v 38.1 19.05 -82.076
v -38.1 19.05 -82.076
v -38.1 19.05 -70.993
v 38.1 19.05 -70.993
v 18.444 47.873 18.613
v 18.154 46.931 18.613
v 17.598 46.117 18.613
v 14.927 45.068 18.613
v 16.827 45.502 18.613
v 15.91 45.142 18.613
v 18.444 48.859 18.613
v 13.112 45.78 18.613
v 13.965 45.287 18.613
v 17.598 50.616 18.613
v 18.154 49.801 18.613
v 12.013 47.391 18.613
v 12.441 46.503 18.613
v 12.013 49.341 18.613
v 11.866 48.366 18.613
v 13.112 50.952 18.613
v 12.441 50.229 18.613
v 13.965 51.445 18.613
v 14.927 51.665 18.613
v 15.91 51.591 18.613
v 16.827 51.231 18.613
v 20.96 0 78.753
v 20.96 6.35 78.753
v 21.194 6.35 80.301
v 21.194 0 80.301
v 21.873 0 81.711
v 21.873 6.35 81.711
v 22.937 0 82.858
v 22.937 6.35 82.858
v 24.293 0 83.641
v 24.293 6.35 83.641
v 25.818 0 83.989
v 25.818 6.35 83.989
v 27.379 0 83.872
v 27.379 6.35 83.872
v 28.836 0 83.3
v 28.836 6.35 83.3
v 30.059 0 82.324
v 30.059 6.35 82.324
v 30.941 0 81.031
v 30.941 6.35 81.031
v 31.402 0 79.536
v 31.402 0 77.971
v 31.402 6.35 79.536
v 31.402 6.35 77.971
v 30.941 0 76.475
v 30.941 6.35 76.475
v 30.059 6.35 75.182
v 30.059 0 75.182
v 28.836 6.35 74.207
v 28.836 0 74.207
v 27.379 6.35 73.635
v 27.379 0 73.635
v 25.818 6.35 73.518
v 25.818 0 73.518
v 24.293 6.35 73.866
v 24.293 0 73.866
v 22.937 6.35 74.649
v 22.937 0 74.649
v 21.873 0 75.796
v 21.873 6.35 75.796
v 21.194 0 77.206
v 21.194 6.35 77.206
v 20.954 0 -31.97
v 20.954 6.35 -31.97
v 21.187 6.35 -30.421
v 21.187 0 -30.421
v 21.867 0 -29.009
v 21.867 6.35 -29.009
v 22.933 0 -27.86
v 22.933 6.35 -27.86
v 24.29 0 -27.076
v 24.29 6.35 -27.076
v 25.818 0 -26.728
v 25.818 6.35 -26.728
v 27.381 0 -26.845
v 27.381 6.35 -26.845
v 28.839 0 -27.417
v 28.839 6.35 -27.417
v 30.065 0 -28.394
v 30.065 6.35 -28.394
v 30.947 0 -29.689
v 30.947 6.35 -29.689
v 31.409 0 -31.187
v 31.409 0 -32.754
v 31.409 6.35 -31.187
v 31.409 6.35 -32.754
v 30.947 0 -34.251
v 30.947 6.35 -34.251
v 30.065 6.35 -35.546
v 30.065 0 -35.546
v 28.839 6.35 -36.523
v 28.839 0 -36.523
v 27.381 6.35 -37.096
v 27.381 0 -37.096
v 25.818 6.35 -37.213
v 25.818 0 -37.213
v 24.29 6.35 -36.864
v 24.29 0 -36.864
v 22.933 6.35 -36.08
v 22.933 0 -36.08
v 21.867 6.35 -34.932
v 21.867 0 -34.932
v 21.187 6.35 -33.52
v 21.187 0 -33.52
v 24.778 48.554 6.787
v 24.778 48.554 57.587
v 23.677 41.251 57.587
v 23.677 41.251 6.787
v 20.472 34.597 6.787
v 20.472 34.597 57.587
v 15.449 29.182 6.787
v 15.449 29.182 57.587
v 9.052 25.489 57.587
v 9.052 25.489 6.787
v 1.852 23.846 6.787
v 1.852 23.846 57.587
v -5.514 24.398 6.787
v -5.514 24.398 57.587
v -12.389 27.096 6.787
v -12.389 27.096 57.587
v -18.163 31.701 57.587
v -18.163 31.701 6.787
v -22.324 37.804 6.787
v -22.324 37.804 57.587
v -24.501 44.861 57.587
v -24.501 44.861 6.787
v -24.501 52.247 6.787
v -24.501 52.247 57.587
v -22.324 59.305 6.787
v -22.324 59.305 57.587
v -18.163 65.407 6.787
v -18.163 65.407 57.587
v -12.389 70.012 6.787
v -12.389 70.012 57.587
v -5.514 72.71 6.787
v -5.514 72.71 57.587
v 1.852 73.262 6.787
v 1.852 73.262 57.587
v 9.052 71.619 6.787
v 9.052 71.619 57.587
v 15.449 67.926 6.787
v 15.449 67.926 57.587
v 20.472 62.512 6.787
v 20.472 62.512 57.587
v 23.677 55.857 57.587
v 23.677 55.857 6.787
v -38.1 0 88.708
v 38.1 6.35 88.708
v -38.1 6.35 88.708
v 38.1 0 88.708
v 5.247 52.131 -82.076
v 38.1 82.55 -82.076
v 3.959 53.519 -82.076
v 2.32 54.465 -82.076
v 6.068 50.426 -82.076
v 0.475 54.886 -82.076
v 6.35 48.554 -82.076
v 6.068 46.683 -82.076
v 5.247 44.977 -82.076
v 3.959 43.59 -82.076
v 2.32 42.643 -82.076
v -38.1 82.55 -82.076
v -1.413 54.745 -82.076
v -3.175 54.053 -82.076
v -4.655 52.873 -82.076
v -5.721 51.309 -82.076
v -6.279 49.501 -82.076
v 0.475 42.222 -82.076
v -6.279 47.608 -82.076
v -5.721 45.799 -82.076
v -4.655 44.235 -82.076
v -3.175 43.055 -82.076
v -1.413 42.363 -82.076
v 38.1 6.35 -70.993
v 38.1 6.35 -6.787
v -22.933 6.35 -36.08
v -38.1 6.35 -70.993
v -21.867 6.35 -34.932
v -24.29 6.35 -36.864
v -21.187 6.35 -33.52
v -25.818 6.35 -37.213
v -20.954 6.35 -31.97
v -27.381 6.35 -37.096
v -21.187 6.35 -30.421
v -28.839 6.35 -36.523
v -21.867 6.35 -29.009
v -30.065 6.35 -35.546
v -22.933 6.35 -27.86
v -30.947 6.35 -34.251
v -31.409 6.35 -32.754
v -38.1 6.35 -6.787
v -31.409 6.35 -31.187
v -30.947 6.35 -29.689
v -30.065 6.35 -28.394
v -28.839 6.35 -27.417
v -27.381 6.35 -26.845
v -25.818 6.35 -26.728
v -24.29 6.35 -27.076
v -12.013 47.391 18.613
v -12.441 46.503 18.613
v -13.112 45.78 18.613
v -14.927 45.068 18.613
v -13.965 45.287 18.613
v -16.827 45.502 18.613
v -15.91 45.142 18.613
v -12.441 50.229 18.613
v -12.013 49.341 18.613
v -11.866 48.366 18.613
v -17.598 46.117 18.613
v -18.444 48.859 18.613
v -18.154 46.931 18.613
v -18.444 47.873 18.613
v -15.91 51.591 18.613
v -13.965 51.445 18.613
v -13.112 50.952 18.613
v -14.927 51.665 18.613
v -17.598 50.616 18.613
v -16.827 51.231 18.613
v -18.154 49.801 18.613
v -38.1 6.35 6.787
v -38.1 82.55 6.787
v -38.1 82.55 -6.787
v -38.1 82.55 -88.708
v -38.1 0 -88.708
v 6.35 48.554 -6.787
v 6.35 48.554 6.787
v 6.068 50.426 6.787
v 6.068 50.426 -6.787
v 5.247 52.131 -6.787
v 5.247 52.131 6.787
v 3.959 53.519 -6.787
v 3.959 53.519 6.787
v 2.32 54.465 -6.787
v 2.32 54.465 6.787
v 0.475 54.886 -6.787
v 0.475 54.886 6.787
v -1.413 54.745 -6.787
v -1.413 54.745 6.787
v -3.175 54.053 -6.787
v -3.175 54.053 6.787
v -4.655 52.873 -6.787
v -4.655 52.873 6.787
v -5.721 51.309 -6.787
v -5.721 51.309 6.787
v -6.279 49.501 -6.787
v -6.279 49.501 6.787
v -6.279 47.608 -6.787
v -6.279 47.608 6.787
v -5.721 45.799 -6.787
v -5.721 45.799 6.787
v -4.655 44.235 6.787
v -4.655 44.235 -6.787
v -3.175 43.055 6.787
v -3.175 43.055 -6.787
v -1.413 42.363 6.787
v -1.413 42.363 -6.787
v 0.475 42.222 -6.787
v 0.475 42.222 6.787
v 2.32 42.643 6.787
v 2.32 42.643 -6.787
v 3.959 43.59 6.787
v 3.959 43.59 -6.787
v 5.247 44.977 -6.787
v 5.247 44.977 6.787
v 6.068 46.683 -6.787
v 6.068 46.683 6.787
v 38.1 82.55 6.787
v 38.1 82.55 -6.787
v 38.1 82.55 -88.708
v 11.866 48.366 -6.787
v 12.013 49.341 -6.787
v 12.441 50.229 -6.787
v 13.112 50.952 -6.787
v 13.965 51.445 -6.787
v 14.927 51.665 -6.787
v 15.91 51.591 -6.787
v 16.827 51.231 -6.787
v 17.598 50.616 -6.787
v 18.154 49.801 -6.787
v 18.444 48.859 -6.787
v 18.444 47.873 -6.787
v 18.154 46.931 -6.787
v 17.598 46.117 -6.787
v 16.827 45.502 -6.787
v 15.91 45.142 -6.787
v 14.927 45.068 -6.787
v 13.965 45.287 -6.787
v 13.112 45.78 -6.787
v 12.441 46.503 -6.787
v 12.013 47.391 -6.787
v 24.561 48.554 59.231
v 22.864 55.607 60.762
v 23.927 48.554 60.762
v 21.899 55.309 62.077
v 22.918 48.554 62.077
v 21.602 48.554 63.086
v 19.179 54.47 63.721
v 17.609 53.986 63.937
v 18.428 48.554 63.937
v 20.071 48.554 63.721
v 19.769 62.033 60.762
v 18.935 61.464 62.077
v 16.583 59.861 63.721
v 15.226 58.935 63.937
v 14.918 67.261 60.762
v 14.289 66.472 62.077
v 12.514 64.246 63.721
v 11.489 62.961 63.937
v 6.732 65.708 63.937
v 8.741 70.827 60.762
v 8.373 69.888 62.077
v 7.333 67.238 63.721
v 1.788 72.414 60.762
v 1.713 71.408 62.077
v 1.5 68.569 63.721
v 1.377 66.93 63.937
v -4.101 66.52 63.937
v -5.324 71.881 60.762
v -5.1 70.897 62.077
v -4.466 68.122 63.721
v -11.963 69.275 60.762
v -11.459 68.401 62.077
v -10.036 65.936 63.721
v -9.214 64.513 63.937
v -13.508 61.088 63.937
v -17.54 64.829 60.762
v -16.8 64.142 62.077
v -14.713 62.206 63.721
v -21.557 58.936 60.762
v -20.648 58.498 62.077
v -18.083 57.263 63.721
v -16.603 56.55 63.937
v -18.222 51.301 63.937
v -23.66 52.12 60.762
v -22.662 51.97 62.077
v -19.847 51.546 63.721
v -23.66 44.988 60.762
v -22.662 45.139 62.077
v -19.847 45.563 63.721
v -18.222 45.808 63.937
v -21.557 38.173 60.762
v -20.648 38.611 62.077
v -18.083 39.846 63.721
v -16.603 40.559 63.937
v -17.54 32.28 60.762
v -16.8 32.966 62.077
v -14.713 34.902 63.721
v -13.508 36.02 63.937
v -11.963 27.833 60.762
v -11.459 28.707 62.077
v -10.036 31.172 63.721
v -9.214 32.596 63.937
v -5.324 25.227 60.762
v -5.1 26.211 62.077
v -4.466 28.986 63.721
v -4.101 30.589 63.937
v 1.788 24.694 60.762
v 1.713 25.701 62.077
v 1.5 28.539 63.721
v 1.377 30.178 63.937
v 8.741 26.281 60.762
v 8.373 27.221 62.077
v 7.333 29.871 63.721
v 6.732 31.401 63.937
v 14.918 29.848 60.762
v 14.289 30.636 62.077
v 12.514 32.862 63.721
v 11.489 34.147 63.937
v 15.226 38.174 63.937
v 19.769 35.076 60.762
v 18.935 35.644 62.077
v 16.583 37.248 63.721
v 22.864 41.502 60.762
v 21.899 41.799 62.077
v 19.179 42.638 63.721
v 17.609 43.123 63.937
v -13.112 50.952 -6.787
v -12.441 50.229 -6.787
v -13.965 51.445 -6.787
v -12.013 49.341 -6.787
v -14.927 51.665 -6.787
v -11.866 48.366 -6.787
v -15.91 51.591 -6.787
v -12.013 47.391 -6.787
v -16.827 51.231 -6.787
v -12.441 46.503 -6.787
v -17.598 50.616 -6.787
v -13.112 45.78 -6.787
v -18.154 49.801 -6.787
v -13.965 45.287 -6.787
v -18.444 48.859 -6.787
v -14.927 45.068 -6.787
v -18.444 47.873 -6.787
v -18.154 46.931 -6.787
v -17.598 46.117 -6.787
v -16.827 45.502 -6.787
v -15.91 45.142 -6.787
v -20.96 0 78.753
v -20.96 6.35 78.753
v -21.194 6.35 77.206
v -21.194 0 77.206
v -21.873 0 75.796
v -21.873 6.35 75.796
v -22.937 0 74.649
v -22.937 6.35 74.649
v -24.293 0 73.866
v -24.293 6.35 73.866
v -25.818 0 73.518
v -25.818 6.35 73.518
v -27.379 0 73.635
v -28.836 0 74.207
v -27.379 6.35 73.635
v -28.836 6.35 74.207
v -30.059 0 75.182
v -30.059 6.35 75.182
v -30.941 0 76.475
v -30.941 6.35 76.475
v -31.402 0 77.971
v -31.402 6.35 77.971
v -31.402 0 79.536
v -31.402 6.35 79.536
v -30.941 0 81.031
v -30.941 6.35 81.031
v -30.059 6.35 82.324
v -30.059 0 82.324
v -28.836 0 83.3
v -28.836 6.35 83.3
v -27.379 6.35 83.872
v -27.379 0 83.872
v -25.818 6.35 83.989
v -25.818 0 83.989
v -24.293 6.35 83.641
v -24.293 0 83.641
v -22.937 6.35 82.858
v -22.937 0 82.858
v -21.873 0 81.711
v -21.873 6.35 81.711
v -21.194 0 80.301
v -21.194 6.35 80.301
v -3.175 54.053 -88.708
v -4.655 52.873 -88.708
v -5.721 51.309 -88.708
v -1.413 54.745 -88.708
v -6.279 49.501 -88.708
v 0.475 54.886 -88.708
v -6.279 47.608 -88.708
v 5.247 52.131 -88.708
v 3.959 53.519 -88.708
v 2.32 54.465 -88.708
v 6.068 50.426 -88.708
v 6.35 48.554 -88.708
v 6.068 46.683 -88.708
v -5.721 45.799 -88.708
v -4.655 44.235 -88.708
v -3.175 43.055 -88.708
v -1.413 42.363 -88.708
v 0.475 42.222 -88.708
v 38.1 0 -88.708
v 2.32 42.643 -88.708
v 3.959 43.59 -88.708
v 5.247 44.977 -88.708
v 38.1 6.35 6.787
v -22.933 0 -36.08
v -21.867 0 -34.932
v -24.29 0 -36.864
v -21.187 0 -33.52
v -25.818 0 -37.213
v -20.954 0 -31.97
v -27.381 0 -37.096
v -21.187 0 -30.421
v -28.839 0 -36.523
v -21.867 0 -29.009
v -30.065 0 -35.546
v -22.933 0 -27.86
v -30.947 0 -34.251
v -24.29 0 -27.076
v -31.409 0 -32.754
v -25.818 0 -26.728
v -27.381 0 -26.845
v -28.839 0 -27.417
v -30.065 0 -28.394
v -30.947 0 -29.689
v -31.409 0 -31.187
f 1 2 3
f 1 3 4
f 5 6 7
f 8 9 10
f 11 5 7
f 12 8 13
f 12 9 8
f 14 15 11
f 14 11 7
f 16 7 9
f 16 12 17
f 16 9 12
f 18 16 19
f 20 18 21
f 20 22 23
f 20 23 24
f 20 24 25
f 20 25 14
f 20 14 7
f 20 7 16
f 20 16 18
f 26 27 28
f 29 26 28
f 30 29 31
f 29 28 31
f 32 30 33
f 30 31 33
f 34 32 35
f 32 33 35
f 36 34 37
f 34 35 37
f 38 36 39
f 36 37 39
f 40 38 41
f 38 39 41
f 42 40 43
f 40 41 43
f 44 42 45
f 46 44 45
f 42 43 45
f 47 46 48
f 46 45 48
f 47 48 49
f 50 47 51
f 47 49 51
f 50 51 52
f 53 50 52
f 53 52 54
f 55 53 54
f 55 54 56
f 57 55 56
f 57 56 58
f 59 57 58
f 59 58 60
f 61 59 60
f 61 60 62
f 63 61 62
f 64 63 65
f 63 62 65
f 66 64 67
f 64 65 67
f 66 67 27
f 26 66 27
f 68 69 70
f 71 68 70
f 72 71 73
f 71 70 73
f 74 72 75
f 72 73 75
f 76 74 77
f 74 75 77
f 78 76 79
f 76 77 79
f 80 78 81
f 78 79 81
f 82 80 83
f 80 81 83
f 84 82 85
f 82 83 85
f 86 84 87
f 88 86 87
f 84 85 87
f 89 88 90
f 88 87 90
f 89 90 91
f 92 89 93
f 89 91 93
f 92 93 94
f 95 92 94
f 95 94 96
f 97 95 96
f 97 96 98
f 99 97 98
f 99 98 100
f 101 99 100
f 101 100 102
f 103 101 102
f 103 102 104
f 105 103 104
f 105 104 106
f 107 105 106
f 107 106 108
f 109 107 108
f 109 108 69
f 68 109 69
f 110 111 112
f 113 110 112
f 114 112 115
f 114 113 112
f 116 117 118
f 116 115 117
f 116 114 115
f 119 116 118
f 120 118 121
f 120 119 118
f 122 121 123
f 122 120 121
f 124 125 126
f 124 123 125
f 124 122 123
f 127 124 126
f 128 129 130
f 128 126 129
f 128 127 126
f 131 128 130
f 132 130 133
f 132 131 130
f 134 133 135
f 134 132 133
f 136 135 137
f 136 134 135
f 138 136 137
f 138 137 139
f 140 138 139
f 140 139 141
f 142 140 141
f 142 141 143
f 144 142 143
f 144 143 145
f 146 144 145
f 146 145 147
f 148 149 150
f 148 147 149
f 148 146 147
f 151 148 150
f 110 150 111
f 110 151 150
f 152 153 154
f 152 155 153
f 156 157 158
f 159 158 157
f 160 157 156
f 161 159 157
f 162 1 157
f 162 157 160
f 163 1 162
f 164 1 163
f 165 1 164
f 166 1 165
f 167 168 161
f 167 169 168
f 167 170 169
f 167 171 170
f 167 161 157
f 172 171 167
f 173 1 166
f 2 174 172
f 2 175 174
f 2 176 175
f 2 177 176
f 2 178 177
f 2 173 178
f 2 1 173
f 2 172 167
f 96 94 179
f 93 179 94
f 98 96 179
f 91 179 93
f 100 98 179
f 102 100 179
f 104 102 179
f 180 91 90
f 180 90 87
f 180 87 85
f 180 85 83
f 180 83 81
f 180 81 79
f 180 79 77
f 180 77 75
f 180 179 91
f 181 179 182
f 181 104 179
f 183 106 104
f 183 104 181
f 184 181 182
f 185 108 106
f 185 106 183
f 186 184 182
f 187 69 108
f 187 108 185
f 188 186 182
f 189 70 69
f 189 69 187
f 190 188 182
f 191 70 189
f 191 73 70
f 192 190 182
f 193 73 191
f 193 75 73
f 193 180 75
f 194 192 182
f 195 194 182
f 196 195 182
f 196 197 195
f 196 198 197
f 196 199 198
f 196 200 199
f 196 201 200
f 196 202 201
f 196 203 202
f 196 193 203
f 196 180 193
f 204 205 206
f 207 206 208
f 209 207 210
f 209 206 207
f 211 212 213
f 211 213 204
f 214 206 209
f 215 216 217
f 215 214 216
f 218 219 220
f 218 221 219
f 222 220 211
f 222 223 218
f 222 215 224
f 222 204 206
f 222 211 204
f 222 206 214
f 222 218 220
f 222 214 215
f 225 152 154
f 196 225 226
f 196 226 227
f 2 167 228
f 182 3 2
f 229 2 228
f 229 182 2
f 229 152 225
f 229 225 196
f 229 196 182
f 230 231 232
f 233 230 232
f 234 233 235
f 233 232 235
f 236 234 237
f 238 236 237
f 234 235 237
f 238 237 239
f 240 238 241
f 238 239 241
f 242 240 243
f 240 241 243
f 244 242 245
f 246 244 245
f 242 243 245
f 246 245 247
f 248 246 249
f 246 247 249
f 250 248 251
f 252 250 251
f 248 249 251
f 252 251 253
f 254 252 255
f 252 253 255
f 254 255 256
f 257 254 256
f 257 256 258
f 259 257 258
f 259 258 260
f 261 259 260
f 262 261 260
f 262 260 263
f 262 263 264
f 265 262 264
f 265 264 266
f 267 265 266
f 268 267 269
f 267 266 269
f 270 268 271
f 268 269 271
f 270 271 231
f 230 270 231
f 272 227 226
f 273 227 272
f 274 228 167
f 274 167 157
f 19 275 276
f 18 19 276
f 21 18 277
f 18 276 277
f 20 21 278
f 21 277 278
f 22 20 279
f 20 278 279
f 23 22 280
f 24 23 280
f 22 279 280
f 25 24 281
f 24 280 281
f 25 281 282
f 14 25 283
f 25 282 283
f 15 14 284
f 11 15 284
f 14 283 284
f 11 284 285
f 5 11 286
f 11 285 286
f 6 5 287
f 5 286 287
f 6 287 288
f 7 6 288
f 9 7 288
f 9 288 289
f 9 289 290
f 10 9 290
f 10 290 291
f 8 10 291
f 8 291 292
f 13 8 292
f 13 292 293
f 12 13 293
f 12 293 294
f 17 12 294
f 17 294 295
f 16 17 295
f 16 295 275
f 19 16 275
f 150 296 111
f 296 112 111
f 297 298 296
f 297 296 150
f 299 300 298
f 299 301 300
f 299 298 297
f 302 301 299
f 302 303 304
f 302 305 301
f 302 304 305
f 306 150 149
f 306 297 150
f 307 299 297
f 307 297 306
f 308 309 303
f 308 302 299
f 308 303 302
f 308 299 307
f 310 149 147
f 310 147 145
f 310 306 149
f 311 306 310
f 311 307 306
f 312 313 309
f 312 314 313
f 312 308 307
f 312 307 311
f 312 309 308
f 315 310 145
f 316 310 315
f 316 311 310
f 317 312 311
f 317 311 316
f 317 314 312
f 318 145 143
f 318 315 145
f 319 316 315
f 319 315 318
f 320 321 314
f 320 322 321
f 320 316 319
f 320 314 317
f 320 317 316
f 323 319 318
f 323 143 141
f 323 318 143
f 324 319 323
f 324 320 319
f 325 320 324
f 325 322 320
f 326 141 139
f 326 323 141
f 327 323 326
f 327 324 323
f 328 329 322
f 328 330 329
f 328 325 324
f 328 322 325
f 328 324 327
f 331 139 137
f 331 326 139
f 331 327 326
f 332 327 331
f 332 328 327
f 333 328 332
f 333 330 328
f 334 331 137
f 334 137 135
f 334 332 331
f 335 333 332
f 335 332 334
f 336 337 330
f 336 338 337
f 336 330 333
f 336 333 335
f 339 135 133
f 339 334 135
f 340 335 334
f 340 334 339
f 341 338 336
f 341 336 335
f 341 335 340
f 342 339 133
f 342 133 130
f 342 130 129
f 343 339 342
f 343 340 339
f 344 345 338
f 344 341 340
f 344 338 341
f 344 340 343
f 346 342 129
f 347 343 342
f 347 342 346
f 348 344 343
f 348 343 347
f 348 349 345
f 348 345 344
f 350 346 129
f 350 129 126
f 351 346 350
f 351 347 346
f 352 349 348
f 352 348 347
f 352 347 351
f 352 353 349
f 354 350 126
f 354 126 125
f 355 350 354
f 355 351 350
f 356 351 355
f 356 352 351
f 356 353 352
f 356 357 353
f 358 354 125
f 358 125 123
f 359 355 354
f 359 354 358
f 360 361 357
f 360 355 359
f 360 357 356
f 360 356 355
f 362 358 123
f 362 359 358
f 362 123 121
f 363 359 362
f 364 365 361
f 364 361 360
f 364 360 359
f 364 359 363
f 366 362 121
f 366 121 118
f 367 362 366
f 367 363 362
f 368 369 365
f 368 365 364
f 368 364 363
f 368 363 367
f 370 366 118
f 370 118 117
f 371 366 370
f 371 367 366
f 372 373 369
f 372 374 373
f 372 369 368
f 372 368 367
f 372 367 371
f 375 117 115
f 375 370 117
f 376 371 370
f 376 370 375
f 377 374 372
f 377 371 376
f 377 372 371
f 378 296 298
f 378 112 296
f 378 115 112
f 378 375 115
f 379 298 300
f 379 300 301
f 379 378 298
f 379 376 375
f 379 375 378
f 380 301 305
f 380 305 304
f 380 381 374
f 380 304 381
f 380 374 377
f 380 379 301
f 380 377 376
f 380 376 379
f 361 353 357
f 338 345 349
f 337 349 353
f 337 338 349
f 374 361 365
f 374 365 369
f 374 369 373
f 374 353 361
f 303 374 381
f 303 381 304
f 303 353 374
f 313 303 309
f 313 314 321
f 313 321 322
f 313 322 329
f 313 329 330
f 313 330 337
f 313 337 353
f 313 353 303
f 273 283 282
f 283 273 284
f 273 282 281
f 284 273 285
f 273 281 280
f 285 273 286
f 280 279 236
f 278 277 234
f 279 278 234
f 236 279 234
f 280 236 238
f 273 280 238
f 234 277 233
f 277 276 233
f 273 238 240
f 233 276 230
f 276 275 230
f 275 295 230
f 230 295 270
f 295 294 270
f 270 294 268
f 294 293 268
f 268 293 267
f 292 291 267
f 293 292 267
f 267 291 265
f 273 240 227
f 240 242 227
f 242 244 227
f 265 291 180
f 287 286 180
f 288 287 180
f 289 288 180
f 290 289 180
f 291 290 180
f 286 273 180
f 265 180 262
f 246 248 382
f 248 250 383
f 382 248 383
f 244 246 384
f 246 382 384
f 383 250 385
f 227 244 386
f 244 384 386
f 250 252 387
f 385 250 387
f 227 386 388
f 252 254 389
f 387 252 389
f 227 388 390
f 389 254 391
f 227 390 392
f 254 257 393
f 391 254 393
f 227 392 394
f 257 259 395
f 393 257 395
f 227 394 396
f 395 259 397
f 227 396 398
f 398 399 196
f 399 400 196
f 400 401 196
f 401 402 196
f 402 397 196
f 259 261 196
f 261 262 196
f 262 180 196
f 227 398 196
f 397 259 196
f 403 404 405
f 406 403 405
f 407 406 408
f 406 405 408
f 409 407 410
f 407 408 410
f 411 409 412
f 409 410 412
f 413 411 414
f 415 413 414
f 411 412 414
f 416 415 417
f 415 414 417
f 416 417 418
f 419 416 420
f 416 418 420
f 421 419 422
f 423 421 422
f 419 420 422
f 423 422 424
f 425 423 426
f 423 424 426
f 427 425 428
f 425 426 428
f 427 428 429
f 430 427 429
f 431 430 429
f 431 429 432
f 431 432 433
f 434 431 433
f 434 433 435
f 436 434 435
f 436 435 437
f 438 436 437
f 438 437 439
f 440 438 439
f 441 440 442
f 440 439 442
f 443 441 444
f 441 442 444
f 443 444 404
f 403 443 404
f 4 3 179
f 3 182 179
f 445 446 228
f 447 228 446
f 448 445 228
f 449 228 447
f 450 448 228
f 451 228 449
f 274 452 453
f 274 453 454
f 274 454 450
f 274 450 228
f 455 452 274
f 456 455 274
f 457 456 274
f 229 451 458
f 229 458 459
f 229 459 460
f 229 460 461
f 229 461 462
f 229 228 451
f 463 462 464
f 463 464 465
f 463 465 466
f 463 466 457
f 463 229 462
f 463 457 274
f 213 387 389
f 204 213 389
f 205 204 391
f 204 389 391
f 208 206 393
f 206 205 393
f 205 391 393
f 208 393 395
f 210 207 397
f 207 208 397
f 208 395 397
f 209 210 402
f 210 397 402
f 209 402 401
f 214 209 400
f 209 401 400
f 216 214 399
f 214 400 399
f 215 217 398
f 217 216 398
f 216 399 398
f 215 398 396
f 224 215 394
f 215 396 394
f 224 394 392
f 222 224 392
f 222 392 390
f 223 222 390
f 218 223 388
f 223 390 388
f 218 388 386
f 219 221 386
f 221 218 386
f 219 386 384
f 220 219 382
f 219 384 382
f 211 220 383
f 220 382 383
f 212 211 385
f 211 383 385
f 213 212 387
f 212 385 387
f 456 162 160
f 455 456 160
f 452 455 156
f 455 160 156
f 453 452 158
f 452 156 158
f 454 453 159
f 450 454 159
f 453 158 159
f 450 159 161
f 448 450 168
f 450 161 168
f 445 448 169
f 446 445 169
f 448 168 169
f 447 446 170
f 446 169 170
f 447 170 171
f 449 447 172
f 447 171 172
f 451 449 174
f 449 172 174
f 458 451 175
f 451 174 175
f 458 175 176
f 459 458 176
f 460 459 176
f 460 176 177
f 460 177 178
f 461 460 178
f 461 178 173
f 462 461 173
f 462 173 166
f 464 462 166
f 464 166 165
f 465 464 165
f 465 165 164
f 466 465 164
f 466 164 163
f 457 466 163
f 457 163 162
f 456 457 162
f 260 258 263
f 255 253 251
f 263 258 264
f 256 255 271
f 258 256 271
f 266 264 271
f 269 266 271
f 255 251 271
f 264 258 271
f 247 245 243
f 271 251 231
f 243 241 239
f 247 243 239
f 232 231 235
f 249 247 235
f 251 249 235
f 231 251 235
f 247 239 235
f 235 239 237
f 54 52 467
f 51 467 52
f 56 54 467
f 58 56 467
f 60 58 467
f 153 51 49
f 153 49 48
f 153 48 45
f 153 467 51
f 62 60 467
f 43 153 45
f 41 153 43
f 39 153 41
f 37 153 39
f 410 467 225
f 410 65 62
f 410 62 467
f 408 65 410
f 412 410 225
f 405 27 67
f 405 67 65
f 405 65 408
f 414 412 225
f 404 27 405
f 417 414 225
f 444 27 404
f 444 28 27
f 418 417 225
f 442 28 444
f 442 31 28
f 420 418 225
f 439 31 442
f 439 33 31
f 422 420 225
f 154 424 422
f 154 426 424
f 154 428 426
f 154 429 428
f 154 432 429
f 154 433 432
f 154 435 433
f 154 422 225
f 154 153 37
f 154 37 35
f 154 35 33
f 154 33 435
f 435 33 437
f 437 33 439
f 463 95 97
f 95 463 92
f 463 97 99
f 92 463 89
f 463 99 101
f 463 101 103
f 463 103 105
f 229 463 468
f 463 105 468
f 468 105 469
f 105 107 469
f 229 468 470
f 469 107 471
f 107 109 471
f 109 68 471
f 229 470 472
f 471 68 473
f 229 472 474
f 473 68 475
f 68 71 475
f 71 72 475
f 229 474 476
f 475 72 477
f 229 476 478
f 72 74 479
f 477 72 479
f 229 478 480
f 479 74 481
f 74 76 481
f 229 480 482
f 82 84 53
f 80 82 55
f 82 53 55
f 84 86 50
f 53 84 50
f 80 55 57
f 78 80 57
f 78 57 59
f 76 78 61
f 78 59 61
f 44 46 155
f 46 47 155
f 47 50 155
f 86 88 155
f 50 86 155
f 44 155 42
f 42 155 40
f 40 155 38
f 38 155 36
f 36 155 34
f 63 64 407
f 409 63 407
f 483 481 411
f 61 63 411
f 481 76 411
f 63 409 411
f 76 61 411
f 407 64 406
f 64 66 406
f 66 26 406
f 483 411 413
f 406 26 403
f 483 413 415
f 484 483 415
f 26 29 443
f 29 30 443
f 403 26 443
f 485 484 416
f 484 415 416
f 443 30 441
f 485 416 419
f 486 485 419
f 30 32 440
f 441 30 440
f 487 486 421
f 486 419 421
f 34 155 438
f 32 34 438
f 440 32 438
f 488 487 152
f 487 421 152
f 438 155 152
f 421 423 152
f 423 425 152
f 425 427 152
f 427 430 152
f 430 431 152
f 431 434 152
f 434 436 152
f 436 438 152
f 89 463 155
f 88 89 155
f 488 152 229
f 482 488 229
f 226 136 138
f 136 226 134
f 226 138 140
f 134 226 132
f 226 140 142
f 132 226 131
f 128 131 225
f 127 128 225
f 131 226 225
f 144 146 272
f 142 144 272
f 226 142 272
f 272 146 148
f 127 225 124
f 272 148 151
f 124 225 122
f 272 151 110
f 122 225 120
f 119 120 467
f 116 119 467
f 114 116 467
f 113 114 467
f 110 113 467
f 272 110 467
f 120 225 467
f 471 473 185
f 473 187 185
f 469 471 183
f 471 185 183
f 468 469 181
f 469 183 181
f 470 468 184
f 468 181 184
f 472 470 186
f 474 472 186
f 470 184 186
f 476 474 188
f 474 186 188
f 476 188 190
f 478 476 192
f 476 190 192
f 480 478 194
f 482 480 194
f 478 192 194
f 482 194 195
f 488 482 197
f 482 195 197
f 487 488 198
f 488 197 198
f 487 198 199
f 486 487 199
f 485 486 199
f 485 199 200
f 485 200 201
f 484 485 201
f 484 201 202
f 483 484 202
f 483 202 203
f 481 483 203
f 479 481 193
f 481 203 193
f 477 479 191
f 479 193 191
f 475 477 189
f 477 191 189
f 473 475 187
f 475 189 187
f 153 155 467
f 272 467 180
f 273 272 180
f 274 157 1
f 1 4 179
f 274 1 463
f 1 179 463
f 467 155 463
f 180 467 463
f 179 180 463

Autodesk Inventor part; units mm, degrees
ref_plane "YZ Plane" through (0, 0, 0) normal (1, 0, 0) x (0, 1, 0)
ref_plane "XZ Plane" through (0, 0, 0) normal (0, 1, 0) x (-1, 0, 0)
ref_plane "XY Plane" through (0, 0, 0) normal (0, 0, 1) x (1, 0, 0)
sketch "Sketch1" plane through (0, 0, 0) normal (0, 1, 0) x (-1, 0, 0)
  line L0 (-38.1, 88.708) -> (38.1, 88.708)
  line L1 (38.1, 88.708) -> (38.1, -88.708)
  line L2 (38.1, -88.708) -> (-38.1, -88.708)
  line L3 (-38.1, -88.708) -> (-38.1, 88.708)
  line L4 (-38.1, 88.708) -> (38.1, -88.708) construction
  line L5 (38.1, 88.708) -> (-38.1, -88.708) construction
  point P0 (0, 0)
  dimension "d0" = 76.2
extrude "Extrusion1" add sketch "Sketch1" along normal blind 6.35
sketch "Sketch2" plane through (0, 6.35, 0) normal (0, 1, 0) x (1, 0, 0)
  line L0 (38.1, -88.708) -> (38.1, 88.708) projected
  line L1 (-38.1, -6.787) -> (38.1, -6.787)
  line L2 (38.1, -6.787) -> (38.1, 6.787)
  line L3 (38.1, 6.787) -> (-38.1, 6.787)
  line L4 (-38.1, 6.787) -> (-38.1, -6.787)
  line L5 (-38.1, -6.787) -> (38.1, 6.787) construction
  line L6 (38.1, -6.787) -> (-38.1, 6.787) construction
  line L7 (-38.1, 88.708) -> (38.1, 88.708)
  line L8 (38.1, 88.708) -> (38.1, 82.0757)
  line L9 (38.1, 82.0757) -> (-38.1, 82.0757)
  line L10 (-38.1, 82.0757) -> (-38.1, 88.708)
  point P0 (0, 0)
extrude "Extrusion2" add sketch "Sketch2" along normal blind 76.2
sketch "Sketch3" plane through (0, 6.35, 0) normal (0, 1, 0) x (1, 0, 0)
  line L0 (-38.1, -88.708) -> (-38.1, 88.708) projected
  line L1 (38.1, 88.708) -> (-38.1, 88.708)
  line L2 (-38.1, 88.708) -> (-38.1, 70.9931)
  line L3 (-38.1, 70.9931) -> (38.1, 70.9931)
  line L4 (38.1, 70.9931) -> (38.1, 88.708)
  point P0 (0, 0)
extrude "Extrusion3" add sketch "Sketch3" along normal blind 12.7
sketch "Sketch4" plane through (-38.1, 6.35, 6.787) normal (0, 0, 1) x (1, 0, 0)
  circle A0 centre (38.1, 42.2042) radius 6.35
  point P0 (38.1, -6.35)
  dimension "d7" = 12.7
extrude "Extrusion4" cut sketch "Sketch4" against normal blind 100.0125
sketch "Sketch5" plane through (-38.1, 6.35, 6.787) normal (0, 0, 1) x (1, 0, 0)
  circle A0 centre (38.1, 42.2042) radius 24.7775
  circle A1 centre (38.1, 42.2042) radius 6.35 projected
  point P0 (38.1, -6.35)
extrude "Extrusion5" add sketch "Sketch5" along normal blind 57.15 contours A0 | A1
fillet "Fillet1" radius 6.35 1 edges at (-24.7775, 48.5542, 63.937)
sketch "Sketch6" plane through (0, 6.35, 0) normal (0, 1, 0) x (1, 0, 0)
  circle A0 centre (-26.2107, -78.7534) radius 5.2502
  circle A1 centre (-26.2107, 31.9702) radius 5.2572
  point P0 (0, 0)
extrude "Extrusion6" cut sketch "Sketch6" against normal blind 25.4
mirror "Mirror1" about plane through (0, 0, 0) normal (1, 0, 0) of "Extrusion6"
sketch "Sketch7" plane through (38.1, 6.35, -6.787) normal (0, 0, -1) x (-1, 0, 0)
  circle A0 centre (22.9263, 42.0163) radius 3.3075
  point P0 (38.1, -6.35)
extrude "Extrusion7" cut sketch "Sketch7" against normal blind 25.4
mirror "Mirror2" about plane through (0, 0, 0) normal (1, 0, 0) of "Extrusion7"
sketch "Sketch8" plane through (0, 6.35, 0) normal (0, 1, 0) x (1, 0, 0)
  point P0 (0, 0)
properties part number "Motor Fixture"
